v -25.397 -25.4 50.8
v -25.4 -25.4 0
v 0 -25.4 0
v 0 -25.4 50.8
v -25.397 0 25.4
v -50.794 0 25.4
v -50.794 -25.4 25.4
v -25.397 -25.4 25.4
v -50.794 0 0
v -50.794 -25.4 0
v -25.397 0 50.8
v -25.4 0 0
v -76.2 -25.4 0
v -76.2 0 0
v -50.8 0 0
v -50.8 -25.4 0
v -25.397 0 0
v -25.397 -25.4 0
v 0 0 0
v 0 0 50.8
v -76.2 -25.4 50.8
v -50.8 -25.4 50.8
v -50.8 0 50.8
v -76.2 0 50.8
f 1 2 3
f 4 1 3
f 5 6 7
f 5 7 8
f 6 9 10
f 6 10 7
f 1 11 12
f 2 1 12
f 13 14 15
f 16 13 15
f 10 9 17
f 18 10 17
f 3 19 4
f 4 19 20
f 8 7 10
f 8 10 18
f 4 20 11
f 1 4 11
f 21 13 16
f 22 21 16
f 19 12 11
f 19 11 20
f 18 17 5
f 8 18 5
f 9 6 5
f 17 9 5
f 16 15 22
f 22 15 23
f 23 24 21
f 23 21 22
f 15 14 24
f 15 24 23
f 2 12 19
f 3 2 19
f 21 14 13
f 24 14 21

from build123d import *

# Parameters (mm, degrees)
F1_W     = 25.3969691694
F1_H     = 25.4
F2_DEPTH = 25.4
F0_W     = 25.4
F0_H     = 50.8


with BuildPart() as f2:
    # F1 (on Front) → F2 (new body)
    with BuildSketch(Plane.XZ):
        with Locations((-38.0954537541, 12.7)):
            Rectangle(F1_W, F1_H)
    extrude(amount=F2_DEPTH)


with BuildPart() as f2b:
    # F0 (on Front) → F2, piece 2 (new body)
    with BuildSketch(Plane.XZ):
        with Locations((-63.5, 25.4)):
            Rectangle(F0_W, F0_H)
    extrude(amount=F2_DEPTH)


with BuildPart() as f2c:
    # F0 (on Front) → F2, piece 3 (new body)
    with BuildSketch(Plane.XZ):
        Polygon((-25.4, 0), (0, 0), (0, 50.8), (-25.3969691694, 50.8), align=None)
    extrude(amount=F2_DEPTH)


solid = Compound([f2.part, f2b.part, f2c.part])
